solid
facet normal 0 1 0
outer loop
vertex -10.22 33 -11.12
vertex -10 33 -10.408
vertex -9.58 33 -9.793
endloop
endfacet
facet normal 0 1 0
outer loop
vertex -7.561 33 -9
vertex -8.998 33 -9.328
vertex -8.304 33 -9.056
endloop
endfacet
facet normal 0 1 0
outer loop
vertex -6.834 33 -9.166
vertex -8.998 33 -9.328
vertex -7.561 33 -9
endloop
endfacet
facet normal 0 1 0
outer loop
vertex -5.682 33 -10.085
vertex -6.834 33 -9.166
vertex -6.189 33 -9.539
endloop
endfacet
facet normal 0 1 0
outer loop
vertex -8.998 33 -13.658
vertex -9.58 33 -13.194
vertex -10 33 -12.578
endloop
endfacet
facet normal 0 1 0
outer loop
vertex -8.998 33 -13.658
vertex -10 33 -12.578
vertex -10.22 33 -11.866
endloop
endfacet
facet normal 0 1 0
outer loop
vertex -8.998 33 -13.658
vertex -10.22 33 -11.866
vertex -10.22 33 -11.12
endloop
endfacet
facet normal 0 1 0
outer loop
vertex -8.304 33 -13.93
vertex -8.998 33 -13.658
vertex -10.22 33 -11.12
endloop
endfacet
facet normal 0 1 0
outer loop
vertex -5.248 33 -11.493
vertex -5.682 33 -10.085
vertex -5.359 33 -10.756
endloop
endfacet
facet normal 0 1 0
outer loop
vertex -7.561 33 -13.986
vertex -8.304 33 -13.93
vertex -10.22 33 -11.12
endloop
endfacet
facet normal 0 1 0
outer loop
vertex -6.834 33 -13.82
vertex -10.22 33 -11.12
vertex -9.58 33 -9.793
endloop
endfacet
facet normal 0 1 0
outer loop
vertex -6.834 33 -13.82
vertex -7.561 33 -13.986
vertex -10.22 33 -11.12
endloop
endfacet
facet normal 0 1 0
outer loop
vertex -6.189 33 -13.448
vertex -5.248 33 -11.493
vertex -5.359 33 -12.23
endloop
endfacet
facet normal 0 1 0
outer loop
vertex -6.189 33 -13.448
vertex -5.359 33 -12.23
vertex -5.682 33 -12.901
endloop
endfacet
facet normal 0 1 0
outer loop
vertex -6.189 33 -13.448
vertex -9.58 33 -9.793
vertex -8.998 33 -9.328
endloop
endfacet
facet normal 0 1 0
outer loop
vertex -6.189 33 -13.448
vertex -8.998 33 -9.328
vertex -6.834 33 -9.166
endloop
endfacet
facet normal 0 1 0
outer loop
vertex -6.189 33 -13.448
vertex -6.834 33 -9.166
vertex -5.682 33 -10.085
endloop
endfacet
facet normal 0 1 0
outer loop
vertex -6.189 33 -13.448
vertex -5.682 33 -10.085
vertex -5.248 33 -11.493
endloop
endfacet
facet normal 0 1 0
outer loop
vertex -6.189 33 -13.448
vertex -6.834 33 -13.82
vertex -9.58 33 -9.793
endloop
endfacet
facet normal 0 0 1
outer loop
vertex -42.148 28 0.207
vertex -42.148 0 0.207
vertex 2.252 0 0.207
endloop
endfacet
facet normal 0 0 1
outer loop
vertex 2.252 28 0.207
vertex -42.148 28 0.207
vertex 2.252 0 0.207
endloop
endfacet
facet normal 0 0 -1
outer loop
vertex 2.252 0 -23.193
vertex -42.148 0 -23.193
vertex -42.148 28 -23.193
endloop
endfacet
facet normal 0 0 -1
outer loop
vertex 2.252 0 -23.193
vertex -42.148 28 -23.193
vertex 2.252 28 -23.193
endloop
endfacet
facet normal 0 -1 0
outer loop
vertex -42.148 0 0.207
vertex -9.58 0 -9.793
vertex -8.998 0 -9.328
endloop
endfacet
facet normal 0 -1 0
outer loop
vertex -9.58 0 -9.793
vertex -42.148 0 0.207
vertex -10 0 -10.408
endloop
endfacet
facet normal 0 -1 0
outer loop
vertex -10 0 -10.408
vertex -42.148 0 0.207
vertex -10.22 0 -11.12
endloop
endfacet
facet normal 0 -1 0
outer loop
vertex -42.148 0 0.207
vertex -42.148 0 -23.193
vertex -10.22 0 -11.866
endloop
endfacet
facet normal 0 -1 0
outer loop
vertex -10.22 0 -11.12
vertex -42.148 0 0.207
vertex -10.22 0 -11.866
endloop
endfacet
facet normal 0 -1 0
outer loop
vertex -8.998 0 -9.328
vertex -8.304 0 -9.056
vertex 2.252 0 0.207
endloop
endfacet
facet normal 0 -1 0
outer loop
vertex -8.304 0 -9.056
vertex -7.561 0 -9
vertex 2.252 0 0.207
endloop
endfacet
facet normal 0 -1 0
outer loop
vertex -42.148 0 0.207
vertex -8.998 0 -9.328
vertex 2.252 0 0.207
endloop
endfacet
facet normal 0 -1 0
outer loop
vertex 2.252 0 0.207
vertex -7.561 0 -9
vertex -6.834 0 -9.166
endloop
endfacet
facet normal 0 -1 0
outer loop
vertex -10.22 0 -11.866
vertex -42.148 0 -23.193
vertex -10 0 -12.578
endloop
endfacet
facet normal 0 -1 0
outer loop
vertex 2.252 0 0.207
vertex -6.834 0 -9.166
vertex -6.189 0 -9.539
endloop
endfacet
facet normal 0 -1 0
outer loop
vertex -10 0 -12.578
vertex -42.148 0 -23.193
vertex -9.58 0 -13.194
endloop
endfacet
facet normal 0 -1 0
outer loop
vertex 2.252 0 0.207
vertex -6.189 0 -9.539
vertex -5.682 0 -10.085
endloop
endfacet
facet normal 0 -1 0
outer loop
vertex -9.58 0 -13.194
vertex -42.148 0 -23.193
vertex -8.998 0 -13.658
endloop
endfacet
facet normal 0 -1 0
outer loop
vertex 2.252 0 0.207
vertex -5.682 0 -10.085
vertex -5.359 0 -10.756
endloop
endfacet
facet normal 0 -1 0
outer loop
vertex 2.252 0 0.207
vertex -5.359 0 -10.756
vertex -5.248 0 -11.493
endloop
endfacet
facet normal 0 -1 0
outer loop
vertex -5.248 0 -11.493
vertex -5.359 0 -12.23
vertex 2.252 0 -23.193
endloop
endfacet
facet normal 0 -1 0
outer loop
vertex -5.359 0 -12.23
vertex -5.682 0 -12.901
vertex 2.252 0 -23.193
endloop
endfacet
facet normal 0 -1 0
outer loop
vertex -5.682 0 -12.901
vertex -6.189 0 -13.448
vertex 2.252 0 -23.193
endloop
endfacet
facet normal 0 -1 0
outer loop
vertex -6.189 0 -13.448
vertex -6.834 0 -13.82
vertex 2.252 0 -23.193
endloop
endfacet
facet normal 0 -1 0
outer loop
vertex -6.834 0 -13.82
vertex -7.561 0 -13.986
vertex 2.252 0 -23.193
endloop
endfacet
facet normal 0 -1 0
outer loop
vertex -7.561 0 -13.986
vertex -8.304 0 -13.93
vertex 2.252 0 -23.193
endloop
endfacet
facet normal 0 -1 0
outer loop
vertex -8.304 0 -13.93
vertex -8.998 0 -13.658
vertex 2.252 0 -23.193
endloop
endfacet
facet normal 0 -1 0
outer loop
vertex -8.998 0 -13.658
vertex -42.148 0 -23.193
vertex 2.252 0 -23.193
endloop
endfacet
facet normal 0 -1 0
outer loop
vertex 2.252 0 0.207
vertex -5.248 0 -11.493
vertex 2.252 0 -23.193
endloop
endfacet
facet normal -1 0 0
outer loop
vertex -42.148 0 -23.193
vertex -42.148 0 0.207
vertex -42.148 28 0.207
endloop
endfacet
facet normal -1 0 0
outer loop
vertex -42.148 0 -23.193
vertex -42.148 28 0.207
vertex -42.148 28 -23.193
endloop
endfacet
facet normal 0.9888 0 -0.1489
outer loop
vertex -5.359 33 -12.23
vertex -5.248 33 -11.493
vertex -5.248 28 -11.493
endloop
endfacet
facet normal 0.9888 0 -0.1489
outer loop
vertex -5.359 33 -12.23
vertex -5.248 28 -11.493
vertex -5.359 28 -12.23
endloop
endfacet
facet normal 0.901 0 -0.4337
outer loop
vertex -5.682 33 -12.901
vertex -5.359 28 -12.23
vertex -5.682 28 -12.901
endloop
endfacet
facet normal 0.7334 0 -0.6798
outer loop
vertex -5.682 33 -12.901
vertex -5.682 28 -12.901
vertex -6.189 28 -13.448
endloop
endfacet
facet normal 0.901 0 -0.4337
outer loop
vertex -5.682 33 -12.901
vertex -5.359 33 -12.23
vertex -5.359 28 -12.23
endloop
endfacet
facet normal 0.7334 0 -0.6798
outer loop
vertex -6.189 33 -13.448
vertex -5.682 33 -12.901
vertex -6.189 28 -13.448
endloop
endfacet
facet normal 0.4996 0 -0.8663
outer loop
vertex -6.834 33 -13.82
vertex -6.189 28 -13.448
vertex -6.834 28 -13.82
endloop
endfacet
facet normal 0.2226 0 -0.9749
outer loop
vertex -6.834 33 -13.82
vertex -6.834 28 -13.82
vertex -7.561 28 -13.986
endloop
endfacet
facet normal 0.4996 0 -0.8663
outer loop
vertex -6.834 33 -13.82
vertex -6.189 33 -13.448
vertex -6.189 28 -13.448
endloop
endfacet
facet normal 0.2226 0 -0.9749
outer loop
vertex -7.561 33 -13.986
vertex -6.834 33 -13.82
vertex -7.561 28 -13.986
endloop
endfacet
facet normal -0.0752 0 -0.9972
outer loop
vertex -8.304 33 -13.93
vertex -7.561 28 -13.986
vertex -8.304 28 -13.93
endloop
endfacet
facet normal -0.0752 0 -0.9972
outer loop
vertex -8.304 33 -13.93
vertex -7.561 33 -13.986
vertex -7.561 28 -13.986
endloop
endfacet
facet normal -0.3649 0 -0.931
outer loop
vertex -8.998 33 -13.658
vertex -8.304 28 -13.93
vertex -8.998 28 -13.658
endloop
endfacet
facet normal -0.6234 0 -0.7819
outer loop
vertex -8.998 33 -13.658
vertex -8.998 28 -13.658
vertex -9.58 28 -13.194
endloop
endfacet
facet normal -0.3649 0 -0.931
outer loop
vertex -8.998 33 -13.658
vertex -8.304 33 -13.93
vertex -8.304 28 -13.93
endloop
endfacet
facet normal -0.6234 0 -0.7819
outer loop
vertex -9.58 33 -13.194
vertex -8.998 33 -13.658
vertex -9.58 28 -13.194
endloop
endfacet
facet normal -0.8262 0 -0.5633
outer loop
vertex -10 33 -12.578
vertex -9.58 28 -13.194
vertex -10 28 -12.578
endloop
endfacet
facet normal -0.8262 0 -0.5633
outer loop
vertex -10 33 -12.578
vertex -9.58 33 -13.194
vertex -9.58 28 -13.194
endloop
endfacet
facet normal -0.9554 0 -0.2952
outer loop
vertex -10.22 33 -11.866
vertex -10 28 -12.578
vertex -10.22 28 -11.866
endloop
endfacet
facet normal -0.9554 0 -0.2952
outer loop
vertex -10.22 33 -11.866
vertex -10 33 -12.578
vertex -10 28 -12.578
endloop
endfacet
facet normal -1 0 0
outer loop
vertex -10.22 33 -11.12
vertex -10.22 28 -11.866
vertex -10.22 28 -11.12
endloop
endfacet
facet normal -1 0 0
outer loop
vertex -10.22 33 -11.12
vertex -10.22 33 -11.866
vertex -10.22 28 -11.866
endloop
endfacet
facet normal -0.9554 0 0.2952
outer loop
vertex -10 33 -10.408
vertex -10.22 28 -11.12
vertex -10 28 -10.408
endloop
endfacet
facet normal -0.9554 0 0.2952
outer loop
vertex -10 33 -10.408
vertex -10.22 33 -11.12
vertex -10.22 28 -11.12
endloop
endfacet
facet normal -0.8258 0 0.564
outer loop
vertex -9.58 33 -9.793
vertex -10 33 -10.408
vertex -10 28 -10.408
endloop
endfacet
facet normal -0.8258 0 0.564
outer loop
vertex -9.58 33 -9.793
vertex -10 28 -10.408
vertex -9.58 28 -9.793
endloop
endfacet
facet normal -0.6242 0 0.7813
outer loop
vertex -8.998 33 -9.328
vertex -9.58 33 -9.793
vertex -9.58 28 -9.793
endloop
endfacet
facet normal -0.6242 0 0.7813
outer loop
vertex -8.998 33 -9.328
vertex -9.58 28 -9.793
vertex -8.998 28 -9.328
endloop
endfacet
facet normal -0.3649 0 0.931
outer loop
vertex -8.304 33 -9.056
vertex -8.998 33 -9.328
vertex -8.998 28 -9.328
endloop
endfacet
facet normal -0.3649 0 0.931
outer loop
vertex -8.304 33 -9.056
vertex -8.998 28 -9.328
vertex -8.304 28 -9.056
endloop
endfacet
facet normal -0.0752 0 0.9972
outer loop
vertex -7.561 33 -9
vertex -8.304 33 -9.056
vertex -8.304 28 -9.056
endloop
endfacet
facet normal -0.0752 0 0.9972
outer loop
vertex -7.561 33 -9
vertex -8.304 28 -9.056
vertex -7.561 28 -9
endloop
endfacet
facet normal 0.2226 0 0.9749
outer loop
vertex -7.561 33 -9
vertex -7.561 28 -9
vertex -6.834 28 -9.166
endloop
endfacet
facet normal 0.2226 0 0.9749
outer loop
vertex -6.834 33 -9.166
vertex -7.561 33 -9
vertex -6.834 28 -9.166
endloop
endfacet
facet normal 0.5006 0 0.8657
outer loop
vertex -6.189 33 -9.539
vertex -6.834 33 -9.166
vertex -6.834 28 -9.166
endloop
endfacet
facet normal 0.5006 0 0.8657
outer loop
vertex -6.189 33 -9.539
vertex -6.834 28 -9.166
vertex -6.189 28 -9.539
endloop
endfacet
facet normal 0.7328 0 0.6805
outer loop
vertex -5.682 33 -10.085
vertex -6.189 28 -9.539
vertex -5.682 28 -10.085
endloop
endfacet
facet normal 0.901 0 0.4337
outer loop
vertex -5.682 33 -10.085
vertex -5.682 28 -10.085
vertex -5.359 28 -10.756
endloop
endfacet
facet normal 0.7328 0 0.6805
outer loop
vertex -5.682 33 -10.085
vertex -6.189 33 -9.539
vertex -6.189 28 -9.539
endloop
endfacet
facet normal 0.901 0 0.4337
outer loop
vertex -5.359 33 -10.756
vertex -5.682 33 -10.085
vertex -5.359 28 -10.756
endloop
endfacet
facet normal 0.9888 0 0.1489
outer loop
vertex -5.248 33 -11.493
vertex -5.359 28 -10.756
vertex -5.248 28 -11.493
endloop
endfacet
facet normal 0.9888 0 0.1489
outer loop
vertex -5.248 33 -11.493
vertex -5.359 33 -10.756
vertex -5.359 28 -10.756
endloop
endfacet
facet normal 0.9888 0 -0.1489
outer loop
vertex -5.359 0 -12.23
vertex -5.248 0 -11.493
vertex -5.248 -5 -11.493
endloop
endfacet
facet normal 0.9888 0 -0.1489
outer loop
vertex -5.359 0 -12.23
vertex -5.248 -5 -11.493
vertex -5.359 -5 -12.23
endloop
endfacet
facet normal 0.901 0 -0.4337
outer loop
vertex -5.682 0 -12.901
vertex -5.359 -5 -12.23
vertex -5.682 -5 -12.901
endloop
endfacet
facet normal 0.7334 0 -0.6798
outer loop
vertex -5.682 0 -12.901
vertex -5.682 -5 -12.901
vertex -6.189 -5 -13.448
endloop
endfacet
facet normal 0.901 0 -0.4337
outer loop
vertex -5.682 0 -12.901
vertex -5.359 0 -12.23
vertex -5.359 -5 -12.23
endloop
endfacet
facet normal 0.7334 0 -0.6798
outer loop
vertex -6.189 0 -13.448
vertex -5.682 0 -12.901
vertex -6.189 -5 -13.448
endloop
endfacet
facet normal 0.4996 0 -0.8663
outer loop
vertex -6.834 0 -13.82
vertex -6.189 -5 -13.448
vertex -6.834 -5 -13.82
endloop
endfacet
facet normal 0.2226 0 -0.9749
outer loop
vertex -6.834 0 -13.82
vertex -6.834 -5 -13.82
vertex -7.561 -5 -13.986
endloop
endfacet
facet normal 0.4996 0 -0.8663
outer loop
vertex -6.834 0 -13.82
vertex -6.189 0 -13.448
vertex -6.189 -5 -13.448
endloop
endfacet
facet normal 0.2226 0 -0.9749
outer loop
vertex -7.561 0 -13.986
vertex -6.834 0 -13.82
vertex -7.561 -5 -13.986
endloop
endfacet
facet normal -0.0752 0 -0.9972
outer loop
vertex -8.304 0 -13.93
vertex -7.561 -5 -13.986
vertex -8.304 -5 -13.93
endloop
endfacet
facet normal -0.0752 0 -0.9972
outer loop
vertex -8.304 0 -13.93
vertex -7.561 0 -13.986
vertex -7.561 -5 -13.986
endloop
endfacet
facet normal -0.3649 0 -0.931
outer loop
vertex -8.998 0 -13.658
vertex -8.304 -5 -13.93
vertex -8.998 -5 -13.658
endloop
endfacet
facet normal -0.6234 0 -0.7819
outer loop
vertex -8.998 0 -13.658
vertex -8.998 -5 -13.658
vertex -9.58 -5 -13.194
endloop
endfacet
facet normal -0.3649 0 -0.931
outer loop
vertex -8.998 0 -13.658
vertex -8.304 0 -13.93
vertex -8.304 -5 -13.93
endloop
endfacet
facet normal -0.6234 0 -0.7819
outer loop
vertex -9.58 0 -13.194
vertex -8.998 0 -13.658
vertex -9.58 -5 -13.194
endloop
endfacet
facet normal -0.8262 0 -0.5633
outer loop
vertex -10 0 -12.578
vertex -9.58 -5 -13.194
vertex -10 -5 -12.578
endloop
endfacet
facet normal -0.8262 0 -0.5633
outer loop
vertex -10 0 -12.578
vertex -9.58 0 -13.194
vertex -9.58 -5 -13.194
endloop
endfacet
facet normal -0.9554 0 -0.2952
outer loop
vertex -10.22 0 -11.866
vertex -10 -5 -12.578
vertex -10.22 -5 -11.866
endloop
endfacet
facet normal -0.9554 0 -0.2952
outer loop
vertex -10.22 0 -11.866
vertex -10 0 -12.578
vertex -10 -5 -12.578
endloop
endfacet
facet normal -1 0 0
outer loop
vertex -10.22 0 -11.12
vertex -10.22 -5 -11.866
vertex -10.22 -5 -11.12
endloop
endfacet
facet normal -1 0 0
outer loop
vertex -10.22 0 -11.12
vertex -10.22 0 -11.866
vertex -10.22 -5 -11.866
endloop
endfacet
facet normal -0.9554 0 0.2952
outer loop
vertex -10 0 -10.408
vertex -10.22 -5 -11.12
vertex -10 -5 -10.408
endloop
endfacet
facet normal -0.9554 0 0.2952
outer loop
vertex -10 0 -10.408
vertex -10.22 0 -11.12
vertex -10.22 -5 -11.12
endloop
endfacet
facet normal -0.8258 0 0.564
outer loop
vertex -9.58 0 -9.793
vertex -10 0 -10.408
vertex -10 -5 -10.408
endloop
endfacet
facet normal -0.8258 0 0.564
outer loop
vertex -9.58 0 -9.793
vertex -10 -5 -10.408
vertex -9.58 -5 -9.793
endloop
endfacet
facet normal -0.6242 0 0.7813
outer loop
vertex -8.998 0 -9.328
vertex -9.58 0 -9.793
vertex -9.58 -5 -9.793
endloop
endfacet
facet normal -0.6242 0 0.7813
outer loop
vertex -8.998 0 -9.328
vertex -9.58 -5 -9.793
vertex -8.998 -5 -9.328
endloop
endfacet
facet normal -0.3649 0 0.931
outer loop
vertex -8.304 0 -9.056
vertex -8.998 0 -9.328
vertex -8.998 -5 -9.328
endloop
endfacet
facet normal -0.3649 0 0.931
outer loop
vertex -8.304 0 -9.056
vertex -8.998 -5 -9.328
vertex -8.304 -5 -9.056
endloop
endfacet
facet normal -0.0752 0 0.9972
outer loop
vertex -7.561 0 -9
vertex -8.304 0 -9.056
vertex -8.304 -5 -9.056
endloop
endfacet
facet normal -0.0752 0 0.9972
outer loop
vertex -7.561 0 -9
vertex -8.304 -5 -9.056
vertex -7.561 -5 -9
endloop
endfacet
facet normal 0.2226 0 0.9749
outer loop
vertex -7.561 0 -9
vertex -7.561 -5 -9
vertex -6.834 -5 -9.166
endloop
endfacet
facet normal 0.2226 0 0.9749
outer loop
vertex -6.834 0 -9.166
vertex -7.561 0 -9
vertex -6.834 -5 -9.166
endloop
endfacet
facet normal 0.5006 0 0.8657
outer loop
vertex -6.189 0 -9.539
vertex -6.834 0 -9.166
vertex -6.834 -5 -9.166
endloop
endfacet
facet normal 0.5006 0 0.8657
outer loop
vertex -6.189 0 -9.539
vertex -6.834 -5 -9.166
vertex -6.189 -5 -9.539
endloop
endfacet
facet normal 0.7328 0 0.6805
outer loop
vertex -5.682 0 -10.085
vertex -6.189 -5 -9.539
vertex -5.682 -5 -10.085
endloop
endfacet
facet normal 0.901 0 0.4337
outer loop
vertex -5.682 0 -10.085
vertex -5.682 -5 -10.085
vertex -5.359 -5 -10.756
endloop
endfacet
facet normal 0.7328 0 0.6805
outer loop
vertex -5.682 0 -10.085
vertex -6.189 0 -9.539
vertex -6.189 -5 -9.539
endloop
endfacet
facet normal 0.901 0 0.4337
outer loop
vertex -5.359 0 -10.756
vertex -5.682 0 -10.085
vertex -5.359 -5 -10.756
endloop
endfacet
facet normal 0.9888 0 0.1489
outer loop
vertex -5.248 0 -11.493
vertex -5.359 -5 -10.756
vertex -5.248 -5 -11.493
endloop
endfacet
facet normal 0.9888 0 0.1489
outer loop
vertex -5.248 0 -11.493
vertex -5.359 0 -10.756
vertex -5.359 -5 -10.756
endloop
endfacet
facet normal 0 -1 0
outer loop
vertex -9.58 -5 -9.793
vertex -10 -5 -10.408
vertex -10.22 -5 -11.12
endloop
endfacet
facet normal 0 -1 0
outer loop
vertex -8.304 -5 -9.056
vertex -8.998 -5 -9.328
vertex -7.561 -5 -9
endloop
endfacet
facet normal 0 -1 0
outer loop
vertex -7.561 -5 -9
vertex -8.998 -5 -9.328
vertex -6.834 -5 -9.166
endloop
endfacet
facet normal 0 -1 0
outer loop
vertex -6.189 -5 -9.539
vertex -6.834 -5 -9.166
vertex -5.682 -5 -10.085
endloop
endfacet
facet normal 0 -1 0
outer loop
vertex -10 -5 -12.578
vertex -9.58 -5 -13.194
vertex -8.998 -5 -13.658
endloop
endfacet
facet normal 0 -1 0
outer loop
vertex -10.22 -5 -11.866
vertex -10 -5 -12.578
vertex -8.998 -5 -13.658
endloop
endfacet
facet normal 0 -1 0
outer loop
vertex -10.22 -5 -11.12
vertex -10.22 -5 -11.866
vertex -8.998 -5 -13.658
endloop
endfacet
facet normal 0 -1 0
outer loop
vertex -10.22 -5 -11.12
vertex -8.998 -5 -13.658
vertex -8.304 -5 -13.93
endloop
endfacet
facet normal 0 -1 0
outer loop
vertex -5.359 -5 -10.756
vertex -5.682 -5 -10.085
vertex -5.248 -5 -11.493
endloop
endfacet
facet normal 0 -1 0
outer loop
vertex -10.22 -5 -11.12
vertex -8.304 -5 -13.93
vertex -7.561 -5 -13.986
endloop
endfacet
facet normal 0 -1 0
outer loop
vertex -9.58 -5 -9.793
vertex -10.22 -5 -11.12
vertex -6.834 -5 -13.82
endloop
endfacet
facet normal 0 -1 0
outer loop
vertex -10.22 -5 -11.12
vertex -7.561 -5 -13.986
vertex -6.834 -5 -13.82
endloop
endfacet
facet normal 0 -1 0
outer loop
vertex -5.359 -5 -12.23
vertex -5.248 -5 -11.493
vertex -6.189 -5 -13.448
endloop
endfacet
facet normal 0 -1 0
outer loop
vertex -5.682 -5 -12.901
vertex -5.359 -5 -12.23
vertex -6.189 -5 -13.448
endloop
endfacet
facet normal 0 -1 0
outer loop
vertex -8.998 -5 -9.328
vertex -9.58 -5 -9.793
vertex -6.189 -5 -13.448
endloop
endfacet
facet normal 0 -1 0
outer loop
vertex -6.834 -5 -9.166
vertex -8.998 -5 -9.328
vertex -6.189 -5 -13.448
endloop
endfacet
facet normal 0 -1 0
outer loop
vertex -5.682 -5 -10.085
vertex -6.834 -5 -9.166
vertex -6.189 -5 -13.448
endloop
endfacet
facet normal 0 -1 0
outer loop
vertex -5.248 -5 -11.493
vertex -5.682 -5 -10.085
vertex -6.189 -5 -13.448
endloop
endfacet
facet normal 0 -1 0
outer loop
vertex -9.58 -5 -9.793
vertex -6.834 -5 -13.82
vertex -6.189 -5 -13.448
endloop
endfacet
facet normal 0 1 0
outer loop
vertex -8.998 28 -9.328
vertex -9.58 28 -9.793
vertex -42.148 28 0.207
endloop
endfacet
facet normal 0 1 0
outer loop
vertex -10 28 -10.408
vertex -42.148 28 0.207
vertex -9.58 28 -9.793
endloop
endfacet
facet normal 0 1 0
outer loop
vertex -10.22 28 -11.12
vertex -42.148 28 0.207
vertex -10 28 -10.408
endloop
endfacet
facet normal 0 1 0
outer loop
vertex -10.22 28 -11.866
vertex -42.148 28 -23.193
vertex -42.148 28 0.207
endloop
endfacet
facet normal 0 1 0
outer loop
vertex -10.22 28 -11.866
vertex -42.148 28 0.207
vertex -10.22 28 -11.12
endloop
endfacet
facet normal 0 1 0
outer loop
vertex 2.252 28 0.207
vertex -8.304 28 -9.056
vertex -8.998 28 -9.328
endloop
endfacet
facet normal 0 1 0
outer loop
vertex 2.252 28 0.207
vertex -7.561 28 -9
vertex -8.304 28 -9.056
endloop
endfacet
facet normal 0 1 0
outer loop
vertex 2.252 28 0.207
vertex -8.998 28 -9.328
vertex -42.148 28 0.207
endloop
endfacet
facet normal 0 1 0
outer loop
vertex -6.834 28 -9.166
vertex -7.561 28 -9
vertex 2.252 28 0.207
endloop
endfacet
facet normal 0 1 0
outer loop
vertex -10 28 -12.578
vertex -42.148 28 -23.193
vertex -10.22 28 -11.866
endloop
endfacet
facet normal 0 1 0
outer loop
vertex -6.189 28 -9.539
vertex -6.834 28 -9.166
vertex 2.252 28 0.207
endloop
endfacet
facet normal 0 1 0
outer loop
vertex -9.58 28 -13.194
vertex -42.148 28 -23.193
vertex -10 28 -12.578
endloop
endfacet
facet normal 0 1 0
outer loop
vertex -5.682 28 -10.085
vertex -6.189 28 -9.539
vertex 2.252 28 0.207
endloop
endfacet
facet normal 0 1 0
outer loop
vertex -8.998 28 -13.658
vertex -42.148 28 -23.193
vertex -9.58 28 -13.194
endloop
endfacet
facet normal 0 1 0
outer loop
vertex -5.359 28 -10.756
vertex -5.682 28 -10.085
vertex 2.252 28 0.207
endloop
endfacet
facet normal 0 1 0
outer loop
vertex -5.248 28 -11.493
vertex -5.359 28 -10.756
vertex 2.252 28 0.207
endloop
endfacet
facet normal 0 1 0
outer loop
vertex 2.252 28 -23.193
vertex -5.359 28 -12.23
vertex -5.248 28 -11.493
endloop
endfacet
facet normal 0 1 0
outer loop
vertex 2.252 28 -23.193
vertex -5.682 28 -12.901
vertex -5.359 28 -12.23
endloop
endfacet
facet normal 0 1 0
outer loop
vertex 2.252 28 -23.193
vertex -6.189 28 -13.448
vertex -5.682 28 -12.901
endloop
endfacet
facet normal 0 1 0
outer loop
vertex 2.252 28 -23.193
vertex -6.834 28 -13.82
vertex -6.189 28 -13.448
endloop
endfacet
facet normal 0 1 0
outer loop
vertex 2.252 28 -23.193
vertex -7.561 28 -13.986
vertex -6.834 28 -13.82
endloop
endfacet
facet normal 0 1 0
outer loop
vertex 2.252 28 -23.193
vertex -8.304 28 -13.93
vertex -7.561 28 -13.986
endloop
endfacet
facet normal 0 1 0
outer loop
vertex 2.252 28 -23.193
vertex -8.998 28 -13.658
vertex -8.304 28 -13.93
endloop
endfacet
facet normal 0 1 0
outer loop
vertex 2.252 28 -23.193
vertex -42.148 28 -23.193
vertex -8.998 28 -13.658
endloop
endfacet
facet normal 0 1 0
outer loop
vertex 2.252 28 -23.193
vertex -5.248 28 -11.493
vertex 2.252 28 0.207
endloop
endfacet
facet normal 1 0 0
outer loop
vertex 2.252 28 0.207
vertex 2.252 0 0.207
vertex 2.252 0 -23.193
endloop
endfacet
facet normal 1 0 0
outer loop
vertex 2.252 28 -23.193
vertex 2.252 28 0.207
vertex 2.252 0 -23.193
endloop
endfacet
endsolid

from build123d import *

# Parameters (mm, degrees)
SKETCH_1_W             = 44.4
SKETCH_1_H             = 23.4
EXTRUDE_1_DEPTH        = 28
SKETCH_2_R             = 2.5
EXTRUDE_2_DEPTH        = 5
PATTERN_LINEAR_1_COUNT = 2
PATTERN_LINEAR_1_PITCH = 33


with BuildPart() as part:
    # 草圖1 → 填料-伸長1 (new body)
    with BuildSketch(Plane(origin=(0, 0, 0), x_dir=(1, 0, 0), z_dir=(0, 1, 0))):
        with Locations((-19.947783251, 11.493103448)):
            Rectangle(SKETCH_1_W, SKETCH_1_H)
    extrude(amount=EXTRUDE_1_DEPTH)

    # 草圖2 → 填料-伸長2 (add)
    with BuildSketch(Plane(origin=(0, 0, 0), x_dir=(1, 0, 0), z_dir=(0, 1, 0))):
        with Locations((-7.747783251, 11.493103448)):
            Circle(SKETCH_2_R)
    extrude_2 = extrude(amount=-EXTRUDE_2_DEPTH)

    # 直線複製排列1: 填料-伸長2 ×2
    with Locations(*[(0, i * PATTERN_LINEAR_1_PITCH, 0) for i in range(1, PATTERN_LINEAR_1_COUNT)]):
        add(extrude_2)


solid = part.part
